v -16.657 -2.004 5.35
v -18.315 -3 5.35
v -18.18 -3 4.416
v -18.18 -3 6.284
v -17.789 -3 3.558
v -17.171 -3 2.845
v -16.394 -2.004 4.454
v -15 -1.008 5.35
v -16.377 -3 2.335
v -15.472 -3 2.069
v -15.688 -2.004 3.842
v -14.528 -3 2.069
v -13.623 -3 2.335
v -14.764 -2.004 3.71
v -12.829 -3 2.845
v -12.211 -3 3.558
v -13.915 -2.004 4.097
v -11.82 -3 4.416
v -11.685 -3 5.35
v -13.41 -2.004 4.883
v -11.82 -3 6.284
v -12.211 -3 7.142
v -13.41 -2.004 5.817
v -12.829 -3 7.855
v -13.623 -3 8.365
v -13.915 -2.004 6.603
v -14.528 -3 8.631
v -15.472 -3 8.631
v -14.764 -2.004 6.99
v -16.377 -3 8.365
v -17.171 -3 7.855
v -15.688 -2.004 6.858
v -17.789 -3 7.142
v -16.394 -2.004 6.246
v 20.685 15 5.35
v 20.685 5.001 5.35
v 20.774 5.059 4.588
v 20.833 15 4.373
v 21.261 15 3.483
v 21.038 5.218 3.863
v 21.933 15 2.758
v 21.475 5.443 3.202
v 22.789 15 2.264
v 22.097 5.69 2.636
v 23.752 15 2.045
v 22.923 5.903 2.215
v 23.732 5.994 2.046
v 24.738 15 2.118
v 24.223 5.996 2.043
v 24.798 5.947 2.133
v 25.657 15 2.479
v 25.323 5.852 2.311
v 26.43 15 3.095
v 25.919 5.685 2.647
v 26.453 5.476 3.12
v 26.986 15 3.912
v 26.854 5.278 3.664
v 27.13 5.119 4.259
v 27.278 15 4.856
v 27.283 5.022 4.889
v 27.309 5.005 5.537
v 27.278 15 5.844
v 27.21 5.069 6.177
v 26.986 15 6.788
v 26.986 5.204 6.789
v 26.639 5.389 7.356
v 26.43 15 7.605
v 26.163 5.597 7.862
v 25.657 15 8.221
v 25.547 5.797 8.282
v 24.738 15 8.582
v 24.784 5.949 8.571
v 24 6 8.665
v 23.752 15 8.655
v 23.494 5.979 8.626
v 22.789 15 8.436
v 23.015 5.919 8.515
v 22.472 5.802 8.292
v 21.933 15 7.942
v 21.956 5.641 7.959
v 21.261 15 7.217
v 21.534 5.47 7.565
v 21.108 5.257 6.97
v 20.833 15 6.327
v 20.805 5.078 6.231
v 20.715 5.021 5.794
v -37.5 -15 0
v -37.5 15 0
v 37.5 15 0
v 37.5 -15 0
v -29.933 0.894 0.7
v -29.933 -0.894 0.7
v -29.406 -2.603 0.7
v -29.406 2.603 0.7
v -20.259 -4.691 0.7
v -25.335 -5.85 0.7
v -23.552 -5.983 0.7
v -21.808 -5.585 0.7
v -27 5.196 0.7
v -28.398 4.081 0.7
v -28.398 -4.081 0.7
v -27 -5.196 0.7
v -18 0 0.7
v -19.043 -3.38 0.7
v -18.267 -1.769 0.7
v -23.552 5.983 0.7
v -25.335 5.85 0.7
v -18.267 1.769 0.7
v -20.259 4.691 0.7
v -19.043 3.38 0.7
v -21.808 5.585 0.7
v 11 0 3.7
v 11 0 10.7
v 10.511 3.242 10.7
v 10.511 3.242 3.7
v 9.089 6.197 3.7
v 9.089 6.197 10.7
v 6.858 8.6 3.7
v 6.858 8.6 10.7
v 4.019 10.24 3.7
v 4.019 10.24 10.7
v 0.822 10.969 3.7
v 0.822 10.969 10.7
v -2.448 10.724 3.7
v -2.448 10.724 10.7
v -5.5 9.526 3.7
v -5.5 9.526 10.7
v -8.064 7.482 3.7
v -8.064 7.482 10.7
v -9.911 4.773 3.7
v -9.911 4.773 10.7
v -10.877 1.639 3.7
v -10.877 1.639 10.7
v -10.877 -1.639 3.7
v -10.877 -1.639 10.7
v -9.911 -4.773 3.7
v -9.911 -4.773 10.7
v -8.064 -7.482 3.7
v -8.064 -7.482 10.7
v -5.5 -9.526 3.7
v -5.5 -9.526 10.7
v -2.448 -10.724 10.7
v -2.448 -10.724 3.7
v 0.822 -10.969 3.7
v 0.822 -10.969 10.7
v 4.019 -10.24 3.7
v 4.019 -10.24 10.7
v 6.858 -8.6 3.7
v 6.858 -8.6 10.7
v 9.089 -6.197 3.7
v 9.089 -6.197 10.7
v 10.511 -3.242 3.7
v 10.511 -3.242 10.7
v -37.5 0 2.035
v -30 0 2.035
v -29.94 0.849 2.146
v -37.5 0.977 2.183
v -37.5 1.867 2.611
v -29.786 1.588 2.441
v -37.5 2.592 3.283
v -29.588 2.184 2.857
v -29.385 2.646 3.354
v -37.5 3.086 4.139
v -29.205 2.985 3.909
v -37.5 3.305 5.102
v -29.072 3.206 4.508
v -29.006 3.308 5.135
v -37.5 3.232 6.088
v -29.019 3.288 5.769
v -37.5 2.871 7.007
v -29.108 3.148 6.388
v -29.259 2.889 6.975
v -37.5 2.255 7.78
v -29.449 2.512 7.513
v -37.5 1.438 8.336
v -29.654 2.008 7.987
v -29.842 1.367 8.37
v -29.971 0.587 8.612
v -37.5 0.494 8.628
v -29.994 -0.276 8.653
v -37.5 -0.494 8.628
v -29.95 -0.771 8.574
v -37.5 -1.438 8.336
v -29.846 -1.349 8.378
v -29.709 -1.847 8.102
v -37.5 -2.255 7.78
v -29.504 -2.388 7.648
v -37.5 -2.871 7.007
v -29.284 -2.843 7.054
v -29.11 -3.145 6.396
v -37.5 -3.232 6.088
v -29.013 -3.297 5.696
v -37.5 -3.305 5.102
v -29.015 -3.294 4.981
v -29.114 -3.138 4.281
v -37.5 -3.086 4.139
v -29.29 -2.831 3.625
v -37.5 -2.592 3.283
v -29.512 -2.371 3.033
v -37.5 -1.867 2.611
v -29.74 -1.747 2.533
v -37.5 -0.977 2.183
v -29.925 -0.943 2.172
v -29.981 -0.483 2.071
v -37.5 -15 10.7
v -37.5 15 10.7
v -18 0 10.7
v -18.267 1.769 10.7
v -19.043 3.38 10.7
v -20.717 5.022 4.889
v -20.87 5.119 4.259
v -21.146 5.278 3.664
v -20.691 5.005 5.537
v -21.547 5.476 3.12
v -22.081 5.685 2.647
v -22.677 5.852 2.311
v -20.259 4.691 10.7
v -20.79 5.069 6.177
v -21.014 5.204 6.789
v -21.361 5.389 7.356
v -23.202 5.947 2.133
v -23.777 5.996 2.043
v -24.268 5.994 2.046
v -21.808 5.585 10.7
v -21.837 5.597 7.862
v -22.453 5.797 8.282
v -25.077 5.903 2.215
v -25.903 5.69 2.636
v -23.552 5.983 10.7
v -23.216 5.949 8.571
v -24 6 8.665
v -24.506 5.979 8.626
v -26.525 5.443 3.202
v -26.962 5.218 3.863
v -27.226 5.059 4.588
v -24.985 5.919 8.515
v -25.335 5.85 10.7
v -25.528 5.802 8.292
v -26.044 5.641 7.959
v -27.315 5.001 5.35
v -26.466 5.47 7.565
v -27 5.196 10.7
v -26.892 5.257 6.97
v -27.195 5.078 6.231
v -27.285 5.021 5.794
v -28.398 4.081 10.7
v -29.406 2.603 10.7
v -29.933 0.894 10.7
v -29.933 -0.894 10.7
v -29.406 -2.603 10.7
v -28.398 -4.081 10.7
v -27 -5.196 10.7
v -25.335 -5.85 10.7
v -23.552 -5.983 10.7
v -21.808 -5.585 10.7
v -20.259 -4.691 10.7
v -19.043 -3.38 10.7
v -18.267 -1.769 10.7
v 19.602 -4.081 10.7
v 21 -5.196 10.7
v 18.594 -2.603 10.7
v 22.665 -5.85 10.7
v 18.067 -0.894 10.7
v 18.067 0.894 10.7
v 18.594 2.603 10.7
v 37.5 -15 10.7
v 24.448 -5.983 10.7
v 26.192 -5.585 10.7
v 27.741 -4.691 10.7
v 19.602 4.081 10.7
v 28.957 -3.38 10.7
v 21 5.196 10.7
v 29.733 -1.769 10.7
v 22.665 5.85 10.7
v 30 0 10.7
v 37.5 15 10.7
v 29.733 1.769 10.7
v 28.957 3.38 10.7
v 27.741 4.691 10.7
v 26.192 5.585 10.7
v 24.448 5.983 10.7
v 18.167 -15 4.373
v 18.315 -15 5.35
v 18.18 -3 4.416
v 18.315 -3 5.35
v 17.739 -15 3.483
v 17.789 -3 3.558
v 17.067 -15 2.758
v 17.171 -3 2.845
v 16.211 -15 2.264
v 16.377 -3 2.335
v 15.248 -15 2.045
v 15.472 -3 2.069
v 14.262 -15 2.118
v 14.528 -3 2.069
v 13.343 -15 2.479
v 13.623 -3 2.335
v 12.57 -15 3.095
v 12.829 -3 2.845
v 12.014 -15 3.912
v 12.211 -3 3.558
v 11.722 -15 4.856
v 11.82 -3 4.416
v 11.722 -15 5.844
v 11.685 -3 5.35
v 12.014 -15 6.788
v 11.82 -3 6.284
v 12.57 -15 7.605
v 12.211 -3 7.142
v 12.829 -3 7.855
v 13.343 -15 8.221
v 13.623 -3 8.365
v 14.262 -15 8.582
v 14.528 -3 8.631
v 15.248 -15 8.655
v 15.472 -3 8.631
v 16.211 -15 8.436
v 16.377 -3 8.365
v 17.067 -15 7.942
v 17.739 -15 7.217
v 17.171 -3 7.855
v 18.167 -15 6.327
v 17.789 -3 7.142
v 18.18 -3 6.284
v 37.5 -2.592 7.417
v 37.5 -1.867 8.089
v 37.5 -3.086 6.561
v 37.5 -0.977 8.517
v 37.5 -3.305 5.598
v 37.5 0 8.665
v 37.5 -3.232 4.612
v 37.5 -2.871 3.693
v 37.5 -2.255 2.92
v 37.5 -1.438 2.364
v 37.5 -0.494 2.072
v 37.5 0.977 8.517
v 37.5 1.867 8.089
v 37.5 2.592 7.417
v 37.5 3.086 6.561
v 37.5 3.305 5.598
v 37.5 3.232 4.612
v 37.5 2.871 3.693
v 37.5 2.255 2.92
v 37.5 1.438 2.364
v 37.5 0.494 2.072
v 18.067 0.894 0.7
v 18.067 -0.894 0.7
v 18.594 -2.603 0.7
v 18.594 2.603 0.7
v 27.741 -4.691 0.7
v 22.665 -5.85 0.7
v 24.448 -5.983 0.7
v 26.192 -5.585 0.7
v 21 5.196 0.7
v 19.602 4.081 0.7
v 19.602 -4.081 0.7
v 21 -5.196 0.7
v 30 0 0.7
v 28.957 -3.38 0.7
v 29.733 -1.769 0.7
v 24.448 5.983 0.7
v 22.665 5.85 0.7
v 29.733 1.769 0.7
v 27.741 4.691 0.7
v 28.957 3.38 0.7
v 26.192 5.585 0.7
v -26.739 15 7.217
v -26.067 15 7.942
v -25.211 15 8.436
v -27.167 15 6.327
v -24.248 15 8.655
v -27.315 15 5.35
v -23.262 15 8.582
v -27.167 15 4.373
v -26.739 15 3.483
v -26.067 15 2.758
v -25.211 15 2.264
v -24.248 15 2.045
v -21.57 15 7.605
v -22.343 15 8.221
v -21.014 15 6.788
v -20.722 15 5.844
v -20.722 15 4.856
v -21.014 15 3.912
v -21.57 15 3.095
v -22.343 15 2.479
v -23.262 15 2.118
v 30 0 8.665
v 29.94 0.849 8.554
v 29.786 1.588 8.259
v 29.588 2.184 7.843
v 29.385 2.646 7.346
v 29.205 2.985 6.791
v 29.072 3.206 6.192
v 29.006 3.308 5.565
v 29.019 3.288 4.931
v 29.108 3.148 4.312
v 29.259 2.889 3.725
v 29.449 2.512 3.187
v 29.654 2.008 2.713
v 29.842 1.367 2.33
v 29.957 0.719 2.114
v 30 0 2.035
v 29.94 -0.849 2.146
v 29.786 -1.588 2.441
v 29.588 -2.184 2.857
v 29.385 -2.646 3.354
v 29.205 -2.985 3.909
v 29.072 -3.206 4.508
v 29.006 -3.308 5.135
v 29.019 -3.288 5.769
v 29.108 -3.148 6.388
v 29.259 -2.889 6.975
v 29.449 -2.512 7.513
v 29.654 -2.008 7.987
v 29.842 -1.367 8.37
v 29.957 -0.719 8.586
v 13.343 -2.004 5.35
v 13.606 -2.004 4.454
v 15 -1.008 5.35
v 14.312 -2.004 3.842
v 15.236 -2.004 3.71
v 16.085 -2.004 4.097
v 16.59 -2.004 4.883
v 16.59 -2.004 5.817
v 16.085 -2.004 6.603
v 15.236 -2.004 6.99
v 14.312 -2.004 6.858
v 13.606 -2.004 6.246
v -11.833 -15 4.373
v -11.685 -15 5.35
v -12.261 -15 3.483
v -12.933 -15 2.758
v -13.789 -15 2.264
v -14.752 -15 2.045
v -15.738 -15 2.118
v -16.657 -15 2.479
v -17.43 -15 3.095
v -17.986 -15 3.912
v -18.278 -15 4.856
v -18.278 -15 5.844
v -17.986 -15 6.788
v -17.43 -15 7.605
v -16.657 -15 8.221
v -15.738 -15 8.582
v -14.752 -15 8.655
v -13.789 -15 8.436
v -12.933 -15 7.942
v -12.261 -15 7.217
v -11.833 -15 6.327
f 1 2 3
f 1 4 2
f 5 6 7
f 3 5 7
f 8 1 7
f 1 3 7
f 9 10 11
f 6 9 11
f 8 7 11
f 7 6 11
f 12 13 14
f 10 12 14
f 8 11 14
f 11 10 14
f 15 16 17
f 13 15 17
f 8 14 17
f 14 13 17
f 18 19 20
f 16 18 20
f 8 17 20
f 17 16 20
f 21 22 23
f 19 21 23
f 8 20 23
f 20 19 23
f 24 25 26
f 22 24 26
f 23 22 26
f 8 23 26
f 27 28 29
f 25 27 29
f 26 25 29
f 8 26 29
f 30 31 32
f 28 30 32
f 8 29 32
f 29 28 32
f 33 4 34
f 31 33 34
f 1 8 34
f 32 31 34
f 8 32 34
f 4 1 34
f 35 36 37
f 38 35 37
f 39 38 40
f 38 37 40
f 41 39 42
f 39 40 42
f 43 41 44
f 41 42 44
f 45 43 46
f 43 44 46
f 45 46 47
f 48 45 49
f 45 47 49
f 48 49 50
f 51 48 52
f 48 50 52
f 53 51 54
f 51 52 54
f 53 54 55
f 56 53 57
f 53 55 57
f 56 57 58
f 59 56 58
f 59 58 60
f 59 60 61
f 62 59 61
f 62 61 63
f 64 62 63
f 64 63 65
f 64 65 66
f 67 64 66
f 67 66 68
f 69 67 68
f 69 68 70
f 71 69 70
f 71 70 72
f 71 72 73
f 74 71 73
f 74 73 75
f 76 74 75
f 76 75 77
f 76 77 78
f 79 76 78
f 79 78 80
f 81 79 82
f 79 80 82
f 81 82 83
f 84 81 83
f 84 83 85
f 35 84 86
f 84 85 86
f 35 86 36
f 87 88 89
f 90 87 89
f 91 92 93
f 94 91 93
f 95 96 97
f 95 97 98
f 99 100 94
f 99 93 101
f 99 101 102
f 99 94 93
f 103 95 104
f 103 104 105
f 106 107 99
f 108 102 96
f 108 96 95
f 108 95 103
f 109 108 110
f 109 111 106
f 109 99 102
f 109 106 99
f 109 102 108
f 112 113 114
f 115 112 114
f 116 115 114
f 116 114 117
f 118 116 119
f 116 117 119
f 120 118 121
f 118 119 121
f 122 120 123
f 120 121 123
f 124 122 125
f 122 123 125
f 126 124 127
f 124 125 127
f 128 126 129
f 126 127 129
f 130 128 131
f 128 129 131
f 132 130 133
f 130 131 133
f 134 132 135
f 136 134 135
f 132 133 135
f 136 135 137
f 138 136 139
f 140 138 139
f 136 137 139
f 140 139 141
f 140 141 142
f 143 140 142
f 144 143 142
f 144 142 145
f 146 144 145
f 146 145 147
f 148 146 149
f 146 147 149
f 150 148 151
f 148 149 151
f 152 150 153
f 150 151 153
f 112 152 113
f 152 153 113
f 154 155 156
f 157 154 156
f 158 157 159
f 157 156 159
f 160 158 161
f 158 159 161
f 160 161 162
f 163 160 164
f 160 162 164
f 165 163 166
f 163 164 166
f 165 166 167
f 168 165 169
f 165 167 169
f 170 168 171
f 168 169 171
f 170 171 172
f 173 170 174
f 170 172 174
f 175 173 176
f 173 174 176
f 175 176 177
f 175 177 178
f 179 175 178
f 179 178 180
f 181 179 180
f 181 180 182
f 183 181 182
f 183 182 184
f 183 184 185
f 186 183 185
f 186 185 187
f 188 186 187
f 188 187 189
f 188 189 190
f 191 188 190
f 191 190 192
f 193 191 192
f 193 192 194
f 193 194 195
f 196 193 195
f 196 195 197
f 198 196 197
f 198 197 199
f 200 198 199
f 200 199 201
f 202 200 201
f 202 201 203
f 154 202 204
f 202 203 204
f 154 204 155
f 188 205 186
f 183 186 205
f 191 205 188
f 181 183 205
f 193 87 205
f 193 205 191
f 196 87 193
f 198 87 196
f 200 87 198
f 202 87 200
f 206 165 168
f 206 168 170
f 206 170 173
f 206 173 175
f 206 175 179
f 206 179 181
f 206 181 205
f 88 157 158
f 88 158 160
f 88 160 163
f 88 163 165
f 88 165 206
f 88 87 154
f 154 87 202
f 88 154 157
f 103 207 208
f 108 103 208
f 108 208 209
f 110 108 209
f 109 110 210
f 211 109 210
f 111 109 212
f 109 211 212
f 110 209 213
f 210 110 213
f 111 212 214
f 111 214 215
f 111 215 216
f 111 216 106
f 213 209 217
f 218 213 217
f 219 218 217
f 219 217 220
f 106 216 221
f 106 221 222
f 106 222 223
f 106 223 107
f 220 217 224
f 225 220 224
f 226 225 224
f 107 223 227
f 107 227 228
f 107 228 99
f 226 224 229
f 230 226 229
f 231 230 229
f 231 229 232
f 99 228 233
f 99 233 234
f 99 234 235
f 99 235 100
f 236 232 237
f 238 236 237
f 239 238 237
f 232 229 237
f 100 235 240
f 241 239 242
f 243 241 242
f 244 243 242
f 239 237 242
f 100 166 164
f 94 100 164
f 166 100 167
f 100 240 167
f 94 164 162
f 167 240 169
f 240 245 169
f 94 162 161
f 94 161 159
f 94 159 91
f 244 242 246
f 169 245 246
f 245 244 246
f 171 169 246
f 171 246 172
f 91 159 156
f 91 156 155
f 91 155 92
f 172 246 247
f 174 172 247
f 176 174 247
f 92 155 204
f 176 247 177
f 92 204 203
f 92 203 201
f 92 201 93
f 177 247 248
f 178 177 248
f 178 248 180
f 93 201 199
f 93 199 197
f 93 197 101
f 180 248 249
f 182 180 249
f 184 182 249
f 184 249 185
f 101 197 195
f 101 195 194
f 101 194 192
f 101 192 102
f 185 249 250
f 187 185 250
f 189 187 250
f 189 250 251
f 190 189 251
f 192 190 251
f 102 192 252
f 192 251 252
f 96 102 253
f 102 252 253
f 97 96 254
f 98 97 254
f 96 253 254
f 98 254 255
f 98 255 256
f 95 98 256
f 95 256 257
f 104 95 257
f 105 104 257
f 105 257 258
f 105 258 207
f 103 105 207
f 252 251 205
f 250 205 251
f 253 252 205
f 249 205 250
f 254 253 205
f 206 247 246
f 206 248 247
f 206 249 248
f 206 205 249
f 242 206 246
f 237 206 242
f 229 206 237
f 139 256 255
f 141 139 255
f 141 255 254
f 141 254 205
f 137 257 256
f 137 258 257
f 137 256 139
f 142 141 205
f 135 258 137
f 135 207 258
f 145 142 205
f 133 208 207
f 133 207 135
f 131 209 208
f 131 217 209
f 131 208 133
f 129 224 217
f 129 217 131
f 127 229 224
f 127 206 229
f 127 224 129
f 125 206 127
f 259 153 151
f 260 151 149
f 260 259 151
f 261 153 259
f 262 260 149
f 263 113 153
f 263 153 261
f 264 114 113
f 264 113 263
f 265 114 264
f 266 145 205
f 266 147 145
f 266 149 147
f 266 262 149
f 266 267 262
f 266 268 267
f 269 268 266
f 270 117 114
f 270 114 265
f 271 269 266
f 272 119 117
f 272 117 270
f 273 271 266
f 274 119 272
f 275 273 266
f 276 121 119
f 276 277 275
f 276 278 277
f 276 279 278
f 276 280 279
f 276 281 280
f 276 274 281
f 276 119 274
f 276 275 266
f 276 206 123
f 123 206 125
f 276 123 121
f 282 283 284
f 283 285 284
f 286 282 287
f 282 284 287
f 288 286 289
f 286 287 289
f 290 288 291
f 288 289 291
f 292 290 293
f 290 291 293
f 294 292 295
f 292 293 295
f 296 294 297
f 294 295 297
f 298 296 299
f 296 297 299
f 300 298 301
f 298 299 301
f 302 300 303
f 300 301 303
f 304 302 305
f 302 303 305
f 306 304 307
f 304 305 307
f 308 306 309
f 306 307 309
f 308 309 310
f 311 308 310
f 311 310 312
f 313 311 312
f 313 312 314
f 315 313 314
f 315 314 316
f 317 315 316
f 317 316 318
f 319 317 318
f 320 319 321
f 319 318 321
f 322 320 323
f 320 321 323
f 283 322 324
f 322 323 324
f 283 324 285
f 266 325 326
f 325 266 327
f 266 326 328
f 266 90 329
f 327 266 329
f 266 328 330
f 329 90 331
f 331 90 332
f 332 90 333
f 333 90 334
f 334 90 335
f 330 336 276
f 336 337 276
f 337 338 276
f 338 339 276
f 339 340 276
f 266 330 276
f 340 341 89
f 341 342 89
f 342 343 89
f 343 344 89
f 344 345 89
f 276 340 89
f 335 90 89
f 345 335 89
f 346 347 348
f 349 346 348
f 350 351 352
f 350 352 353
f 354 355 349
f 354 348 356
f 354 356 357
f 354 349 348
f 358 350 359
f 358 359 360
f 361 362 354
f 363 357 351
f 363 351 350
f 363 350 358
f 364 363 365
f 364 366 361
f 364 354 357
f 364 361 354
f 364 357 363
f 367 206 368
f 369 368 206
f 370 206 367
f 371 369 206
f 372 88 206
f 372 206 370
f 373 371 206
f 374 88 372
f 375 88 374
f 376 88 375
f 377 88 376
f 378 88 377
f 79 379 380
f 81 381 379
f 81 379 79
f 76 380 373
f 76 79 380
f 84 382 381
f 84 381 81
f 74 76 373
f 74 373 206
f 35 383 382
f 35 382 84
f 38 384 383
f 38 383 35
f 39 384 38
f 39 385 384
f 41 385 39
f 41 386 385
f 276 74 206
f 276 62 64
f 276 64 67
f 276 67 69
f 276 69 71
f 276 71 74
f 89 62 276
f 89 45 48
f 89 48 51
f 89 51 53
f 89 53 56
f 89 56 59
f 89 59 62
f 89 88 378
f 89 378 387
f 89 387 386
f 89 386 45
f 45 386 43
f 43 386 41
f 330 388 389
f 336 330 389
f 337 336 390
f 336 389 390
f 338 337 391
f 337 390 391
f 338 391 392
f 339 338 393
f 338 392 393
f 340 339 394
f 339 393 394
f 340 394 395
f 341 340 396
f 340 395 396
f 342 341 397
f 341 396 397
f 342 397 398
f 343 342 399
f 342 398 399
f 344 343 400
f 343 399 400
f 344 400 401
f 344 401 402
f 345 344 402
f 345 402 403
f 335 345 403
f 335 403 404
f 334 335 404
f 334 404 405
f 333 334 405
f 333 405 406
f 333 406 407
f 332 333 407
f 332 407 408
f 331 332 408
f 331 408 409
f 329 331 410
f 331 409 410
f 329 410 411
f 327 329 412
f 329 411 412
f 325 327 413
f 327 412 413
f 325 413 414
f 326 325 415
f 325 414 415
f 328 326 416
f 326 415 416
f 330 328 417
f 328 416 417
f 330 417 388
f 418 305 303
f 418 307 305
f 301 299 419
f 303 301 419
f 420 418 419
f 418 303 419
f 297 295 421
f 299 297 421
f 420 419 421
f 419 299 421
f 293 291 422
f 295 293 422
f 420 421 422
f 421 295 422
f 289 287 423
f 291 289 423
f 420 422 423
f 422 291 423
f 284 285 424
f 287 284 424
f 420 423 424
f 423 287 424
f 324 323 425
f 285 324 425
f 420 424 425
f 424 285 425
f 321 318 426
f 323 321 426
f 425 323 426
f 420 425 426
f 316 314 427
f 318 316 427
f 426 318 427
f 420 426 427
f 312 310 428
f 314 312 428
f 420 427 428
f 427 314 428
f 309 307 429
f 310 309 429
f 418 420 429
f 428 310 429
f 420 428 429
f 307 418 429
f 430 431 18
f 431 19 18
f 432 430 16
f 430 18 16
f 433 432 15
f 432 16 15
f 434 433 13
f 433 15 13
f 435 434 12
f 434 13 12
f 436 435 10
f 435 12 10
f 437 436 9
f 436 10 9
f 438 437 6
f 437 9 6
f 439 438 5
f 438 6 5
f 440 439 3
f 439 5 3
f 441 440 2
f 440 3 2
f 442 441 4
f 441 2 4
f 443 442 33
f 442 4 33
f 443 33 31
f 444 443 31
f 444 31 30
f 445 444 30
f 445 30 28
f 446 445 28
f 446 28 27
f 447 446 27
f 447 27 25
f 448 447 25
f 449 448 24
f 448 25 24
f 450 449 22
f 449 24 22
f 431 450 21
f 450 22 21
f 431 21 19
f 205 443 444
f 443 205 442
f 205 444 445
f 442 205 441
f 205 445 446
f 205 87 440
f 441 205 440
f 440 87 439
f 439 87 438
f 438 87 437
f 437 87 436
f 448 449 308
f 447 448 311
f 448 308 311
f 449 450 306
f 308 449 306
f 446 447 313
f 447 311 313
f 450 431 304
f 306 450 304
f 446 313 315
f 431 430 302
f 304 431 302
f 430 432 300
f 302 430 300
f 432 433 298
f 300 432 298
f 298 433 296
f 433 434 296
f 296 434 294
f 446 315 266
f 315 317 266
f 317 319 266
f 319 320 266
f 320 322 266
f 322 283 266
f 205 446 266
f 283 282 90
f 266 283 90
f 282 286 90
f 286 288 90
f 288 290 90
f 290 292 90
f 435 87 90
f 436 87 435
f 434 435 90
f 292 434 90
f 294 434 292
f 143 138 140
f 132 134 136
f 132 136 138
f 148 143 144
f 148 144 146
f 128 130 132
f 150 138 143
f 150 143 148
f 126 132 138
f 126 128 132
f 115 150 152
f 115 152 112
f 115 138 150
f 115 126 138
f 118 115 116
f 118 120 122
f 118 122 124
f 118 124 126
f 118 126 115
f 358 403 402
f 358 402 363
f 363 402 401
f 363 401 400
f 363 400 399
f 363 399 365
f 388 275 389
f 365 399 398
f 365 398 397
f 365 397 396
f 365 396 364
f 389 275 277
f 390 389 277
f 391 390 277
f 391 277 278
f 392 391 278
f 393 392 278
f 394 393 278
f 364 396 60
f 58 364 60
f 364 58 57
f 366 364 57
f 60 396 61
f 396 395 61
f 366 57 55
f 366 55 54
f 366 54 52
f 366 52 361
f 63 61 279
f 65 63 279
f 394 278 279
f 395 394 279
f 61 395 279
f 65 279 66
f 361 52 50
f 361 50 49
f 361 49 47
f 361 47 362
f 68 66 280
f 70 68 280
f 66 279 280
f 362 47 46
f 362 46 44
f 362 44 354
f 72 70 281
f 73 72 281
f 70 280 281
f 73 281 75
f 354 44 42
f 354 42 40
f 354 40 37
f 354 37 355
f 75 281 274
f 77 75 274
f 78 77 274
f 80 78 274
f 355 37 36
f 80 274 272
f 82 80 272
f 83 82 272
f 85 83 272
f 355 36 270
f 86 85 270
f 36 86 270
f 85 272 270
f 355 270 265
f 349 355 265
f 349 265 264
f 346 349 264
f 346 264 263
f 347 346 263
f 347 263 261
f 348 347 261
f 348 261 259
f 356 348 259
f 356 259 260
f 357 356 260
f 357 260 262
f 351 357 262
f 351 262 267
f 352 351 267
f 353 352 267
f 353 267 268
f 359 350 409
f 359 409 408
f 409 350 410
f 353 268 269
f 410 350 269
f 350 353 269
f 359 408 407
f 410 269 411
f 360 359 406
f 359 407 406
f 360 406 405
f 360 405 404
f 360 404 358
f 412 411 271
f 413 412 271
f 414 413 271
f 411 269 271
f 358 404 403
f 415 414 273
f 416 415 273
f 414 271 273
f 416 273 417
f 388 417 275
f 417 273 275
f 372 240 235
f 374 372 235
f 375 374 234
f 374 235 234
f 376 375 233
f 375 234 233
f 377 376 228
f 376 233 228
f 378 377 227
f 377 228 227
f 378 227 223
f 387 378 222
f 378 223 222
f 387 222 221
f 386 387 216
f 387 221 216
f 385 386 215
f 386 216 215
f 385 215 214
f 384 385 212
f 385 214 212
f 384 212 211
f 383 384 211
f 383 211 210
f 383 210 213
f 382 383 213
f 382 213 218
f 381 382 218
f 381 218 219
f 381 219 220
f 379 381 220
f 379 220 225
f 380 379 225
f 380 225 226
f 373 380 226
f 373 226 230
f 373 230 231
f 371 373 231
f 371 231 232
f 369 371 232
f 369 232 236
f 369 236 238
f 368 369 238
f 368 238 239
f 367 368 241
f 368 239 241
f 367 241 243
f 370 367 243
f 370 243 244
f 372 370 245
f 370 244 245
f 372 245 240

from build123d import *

# Parameters (mm, degrees)
ESBO_O1_W                                   = 75
ESBO_O1_H                                   = 30
RESSALTO_EXTRUS_O1_DEPTH                    = 10.7
ESBO_O2_R                                   = 6
CORTE_EXTRUS_O1_DEPTH                       = 10
ESBO_O7_R                                   = 11
CORTE_EXTRUS_O6_DEPTH                       = 7
FURO_ROSCADO_PARA_CONDU_TE_DE_1_4_281_D     = 6.6294
FURO_ROSCADO_PARA_CONDU_TE_DE_1_4_281_DEPTH = 15
FURO_ROSCADO_PARA_CONDU_TE_DE_1_4_281_TIP   = 1.991672694
FURO_ROSCADO_PARA_CONDU_TE_DE_1_4_282_D     = 6.6294
FURO_ROSCADO_PARA_CONDU_TE_DE_1_4_282_DEPTH = 14.96
FURO_ROSCADO_PARA_CONDU_TE_DE_1_4_282_TIP   = 1.991672694
FURO_ROSCADO_PARA_CONDU_TE_DE_1_4_283_D     = 6.6294
FURO_ROSCADO_PARA_CONDU_TE_DE_1_4_283_DEPTH = 15
FURO_ROSCADO_PARA_CONDU_TE_DE_1_4_283_TIP   = 1.991672694
FURO_ROSCADO_PARA_CONDU_TE_DE_1_4_284_D     = 6.6294
FURO_ROSCADO_PARA_CONDU_TE_DE_1_4_284_DEPTH = 12
FURO_ROSCADO_PARA_CONDU_TE_DE_1_4_284_TIP   = 1.991672694


with BuildPart() as part:
    # Esboço1 → Ressalto-extrusão1 (new body)
    with BuildSketch(Plane.XY):
        Rectangle(ESBO_O1_W, ESBO_O1_H)
    extrude(amount=RESSALTO_EXTRUS_O1_DEPTH)

    # Esboço2 → Corte-extrusão1 (cut)
    with BuildSketch(Plane.XY.offset(10.7)):
        with Locations((-24, 0)):
            Circle(ESBO_O2_R)
        with Locations((24, 0)):
            Circle(ESBO_O2_R)
    extrude(amount=-CORTE_EXTRUS_O1_DEPTH, mode=Mode.SUBTRACT)

    # Esboço7 → Corte-extrusão6 (cut)
    with BuildSketch(Plane.XY.offset(10.7)):
        Circle(ESBO_O7_R)
    extrude(amount=-CORTE_EXTRUS_O6_DEPTH, mode=Mode.SUBTRACT)

    # Furo roscado para conduíte de 1/4-281
    with Locations(Plane(origin=(0, 15, 0), x_dir=(1, 0, 0), z_dir=(0, 1, 0))):
        with Locations((-24, -5.35), (24, -5.35)):
            Hole(FURO_ROSCADO_PARA_CONDU_TE_DE_1_4_281_D / 2, depth=FURO_ROSCADO_PARA_CONDU_TE_DE_1_4_281_DEPTH)
            with Locations((0, 0, -(FURO_ROSCADO_PARA_CONDU_TE_DE_1_4_281_DEPTH + FURO_ROSCADO_PARA_CONDU_TE_DE_1_4_281_TIP / 2))):  # 118° drill point
                Cone(0, FURO_ROSCADO_PARA_CONDU_TE_DE_1_4_281_D / 2, FURO_ROSCADO_PARA_CONDU_TE_DE_1_4_281_TIP, mode=Mode.SUBTRACT)

    # Furo roscado para conduíte de 1/4-282
    with Locations(Plane.ZY.offset(37.5)):
        with Locations((5.35, 0)):
            Hole(FURO_ROSCADO_PARA_CONDU_TE_DE_1_4_282_D / 2, depth=FURO_ROSCADO_PARA_CONDU_TE_DE_1_4_282_DEPTH)
            with Locations((0, 0, -(FURO_ROSCADO_PARA_CONDU_TE_DE_1_4_282_DEPTH + FURO_ROSCADO_PARA_CONDU_TE_DE_1_4_282_TIP / 2))):  # 118° drill point
                Cone(0, FURO_ROSCADO_PARA_CONDU_TE_DE_1_4_282_D / 2, FURO_ROSCADO_PARA_CONDU_TE_DE_1_4_282_TIP, mode=Mode.SUBTRACT)

    # Furo roscado para conduíte de 1/4-283
    with Locations(Plane(origin=(37.5, 0, 0), x_dir=(0, 0, -1), z_dir=(1, 0, 0))):
        with Locations((-5.35, 0)):
            Hole(FURO_ROSCADO_PARA_CONDU_TE_DE_1_4_283_D / 2, depth=FURO_ROSCADO_PARA_CONDU_TE_DE_1_4_283_DEPTH)
            with Locations((0, 0, -(FURO_ROSCADO_PARA_CONDU_TE_DE_1_4_283_DEPTH + FURO_ROSCADO_PARA_CONDU_TE_DE_1_4_283_TIP / 2))):  # 118° drill point
                Cone(0, FURO_ROSCADO_PARA_CONDU_TE_DE_1_4_283_D / 2, FURO_ROSCADO_PARA_CONDU_TE_DE_1_4_283_TIP, mode=Mode.SUBTRACT)

    # Furo roscado para conduíte de 1/4-284
    with Locations(Plane(origin=(0, -15, 0), x_dir=(-1, 0, 0), z_dir=(0, -1, 0))):
        with Locations((15, -5.35), (-15, -5.35)):
            Hole(FURO_ROSCADO_PARA_CONDU_TE_DE_1_4_284_D / 2, depth=FURO_ROSCADO_PARA_CONDU_TE_DE_1_4_284_DEPTH)
            with Locations((0, 0, -(FURO_ROSCADO_PARA_CONDU_TE_DE_1_4_284_DEPTH + FURO_ROSCADO_PARA_CONDU_TE_DE_1_4_284_TIP / 2))):  # 118° drill point
                Cone(0, FURO_ROSCADO_PARA_CONDU_TE_DE_1_4_284_D / 2, FURO_ROSCADO_PARA_CONDU_TE_DE_1_4_284_TIP, mode=Mode.SUBTRACT)


solid = part.part
